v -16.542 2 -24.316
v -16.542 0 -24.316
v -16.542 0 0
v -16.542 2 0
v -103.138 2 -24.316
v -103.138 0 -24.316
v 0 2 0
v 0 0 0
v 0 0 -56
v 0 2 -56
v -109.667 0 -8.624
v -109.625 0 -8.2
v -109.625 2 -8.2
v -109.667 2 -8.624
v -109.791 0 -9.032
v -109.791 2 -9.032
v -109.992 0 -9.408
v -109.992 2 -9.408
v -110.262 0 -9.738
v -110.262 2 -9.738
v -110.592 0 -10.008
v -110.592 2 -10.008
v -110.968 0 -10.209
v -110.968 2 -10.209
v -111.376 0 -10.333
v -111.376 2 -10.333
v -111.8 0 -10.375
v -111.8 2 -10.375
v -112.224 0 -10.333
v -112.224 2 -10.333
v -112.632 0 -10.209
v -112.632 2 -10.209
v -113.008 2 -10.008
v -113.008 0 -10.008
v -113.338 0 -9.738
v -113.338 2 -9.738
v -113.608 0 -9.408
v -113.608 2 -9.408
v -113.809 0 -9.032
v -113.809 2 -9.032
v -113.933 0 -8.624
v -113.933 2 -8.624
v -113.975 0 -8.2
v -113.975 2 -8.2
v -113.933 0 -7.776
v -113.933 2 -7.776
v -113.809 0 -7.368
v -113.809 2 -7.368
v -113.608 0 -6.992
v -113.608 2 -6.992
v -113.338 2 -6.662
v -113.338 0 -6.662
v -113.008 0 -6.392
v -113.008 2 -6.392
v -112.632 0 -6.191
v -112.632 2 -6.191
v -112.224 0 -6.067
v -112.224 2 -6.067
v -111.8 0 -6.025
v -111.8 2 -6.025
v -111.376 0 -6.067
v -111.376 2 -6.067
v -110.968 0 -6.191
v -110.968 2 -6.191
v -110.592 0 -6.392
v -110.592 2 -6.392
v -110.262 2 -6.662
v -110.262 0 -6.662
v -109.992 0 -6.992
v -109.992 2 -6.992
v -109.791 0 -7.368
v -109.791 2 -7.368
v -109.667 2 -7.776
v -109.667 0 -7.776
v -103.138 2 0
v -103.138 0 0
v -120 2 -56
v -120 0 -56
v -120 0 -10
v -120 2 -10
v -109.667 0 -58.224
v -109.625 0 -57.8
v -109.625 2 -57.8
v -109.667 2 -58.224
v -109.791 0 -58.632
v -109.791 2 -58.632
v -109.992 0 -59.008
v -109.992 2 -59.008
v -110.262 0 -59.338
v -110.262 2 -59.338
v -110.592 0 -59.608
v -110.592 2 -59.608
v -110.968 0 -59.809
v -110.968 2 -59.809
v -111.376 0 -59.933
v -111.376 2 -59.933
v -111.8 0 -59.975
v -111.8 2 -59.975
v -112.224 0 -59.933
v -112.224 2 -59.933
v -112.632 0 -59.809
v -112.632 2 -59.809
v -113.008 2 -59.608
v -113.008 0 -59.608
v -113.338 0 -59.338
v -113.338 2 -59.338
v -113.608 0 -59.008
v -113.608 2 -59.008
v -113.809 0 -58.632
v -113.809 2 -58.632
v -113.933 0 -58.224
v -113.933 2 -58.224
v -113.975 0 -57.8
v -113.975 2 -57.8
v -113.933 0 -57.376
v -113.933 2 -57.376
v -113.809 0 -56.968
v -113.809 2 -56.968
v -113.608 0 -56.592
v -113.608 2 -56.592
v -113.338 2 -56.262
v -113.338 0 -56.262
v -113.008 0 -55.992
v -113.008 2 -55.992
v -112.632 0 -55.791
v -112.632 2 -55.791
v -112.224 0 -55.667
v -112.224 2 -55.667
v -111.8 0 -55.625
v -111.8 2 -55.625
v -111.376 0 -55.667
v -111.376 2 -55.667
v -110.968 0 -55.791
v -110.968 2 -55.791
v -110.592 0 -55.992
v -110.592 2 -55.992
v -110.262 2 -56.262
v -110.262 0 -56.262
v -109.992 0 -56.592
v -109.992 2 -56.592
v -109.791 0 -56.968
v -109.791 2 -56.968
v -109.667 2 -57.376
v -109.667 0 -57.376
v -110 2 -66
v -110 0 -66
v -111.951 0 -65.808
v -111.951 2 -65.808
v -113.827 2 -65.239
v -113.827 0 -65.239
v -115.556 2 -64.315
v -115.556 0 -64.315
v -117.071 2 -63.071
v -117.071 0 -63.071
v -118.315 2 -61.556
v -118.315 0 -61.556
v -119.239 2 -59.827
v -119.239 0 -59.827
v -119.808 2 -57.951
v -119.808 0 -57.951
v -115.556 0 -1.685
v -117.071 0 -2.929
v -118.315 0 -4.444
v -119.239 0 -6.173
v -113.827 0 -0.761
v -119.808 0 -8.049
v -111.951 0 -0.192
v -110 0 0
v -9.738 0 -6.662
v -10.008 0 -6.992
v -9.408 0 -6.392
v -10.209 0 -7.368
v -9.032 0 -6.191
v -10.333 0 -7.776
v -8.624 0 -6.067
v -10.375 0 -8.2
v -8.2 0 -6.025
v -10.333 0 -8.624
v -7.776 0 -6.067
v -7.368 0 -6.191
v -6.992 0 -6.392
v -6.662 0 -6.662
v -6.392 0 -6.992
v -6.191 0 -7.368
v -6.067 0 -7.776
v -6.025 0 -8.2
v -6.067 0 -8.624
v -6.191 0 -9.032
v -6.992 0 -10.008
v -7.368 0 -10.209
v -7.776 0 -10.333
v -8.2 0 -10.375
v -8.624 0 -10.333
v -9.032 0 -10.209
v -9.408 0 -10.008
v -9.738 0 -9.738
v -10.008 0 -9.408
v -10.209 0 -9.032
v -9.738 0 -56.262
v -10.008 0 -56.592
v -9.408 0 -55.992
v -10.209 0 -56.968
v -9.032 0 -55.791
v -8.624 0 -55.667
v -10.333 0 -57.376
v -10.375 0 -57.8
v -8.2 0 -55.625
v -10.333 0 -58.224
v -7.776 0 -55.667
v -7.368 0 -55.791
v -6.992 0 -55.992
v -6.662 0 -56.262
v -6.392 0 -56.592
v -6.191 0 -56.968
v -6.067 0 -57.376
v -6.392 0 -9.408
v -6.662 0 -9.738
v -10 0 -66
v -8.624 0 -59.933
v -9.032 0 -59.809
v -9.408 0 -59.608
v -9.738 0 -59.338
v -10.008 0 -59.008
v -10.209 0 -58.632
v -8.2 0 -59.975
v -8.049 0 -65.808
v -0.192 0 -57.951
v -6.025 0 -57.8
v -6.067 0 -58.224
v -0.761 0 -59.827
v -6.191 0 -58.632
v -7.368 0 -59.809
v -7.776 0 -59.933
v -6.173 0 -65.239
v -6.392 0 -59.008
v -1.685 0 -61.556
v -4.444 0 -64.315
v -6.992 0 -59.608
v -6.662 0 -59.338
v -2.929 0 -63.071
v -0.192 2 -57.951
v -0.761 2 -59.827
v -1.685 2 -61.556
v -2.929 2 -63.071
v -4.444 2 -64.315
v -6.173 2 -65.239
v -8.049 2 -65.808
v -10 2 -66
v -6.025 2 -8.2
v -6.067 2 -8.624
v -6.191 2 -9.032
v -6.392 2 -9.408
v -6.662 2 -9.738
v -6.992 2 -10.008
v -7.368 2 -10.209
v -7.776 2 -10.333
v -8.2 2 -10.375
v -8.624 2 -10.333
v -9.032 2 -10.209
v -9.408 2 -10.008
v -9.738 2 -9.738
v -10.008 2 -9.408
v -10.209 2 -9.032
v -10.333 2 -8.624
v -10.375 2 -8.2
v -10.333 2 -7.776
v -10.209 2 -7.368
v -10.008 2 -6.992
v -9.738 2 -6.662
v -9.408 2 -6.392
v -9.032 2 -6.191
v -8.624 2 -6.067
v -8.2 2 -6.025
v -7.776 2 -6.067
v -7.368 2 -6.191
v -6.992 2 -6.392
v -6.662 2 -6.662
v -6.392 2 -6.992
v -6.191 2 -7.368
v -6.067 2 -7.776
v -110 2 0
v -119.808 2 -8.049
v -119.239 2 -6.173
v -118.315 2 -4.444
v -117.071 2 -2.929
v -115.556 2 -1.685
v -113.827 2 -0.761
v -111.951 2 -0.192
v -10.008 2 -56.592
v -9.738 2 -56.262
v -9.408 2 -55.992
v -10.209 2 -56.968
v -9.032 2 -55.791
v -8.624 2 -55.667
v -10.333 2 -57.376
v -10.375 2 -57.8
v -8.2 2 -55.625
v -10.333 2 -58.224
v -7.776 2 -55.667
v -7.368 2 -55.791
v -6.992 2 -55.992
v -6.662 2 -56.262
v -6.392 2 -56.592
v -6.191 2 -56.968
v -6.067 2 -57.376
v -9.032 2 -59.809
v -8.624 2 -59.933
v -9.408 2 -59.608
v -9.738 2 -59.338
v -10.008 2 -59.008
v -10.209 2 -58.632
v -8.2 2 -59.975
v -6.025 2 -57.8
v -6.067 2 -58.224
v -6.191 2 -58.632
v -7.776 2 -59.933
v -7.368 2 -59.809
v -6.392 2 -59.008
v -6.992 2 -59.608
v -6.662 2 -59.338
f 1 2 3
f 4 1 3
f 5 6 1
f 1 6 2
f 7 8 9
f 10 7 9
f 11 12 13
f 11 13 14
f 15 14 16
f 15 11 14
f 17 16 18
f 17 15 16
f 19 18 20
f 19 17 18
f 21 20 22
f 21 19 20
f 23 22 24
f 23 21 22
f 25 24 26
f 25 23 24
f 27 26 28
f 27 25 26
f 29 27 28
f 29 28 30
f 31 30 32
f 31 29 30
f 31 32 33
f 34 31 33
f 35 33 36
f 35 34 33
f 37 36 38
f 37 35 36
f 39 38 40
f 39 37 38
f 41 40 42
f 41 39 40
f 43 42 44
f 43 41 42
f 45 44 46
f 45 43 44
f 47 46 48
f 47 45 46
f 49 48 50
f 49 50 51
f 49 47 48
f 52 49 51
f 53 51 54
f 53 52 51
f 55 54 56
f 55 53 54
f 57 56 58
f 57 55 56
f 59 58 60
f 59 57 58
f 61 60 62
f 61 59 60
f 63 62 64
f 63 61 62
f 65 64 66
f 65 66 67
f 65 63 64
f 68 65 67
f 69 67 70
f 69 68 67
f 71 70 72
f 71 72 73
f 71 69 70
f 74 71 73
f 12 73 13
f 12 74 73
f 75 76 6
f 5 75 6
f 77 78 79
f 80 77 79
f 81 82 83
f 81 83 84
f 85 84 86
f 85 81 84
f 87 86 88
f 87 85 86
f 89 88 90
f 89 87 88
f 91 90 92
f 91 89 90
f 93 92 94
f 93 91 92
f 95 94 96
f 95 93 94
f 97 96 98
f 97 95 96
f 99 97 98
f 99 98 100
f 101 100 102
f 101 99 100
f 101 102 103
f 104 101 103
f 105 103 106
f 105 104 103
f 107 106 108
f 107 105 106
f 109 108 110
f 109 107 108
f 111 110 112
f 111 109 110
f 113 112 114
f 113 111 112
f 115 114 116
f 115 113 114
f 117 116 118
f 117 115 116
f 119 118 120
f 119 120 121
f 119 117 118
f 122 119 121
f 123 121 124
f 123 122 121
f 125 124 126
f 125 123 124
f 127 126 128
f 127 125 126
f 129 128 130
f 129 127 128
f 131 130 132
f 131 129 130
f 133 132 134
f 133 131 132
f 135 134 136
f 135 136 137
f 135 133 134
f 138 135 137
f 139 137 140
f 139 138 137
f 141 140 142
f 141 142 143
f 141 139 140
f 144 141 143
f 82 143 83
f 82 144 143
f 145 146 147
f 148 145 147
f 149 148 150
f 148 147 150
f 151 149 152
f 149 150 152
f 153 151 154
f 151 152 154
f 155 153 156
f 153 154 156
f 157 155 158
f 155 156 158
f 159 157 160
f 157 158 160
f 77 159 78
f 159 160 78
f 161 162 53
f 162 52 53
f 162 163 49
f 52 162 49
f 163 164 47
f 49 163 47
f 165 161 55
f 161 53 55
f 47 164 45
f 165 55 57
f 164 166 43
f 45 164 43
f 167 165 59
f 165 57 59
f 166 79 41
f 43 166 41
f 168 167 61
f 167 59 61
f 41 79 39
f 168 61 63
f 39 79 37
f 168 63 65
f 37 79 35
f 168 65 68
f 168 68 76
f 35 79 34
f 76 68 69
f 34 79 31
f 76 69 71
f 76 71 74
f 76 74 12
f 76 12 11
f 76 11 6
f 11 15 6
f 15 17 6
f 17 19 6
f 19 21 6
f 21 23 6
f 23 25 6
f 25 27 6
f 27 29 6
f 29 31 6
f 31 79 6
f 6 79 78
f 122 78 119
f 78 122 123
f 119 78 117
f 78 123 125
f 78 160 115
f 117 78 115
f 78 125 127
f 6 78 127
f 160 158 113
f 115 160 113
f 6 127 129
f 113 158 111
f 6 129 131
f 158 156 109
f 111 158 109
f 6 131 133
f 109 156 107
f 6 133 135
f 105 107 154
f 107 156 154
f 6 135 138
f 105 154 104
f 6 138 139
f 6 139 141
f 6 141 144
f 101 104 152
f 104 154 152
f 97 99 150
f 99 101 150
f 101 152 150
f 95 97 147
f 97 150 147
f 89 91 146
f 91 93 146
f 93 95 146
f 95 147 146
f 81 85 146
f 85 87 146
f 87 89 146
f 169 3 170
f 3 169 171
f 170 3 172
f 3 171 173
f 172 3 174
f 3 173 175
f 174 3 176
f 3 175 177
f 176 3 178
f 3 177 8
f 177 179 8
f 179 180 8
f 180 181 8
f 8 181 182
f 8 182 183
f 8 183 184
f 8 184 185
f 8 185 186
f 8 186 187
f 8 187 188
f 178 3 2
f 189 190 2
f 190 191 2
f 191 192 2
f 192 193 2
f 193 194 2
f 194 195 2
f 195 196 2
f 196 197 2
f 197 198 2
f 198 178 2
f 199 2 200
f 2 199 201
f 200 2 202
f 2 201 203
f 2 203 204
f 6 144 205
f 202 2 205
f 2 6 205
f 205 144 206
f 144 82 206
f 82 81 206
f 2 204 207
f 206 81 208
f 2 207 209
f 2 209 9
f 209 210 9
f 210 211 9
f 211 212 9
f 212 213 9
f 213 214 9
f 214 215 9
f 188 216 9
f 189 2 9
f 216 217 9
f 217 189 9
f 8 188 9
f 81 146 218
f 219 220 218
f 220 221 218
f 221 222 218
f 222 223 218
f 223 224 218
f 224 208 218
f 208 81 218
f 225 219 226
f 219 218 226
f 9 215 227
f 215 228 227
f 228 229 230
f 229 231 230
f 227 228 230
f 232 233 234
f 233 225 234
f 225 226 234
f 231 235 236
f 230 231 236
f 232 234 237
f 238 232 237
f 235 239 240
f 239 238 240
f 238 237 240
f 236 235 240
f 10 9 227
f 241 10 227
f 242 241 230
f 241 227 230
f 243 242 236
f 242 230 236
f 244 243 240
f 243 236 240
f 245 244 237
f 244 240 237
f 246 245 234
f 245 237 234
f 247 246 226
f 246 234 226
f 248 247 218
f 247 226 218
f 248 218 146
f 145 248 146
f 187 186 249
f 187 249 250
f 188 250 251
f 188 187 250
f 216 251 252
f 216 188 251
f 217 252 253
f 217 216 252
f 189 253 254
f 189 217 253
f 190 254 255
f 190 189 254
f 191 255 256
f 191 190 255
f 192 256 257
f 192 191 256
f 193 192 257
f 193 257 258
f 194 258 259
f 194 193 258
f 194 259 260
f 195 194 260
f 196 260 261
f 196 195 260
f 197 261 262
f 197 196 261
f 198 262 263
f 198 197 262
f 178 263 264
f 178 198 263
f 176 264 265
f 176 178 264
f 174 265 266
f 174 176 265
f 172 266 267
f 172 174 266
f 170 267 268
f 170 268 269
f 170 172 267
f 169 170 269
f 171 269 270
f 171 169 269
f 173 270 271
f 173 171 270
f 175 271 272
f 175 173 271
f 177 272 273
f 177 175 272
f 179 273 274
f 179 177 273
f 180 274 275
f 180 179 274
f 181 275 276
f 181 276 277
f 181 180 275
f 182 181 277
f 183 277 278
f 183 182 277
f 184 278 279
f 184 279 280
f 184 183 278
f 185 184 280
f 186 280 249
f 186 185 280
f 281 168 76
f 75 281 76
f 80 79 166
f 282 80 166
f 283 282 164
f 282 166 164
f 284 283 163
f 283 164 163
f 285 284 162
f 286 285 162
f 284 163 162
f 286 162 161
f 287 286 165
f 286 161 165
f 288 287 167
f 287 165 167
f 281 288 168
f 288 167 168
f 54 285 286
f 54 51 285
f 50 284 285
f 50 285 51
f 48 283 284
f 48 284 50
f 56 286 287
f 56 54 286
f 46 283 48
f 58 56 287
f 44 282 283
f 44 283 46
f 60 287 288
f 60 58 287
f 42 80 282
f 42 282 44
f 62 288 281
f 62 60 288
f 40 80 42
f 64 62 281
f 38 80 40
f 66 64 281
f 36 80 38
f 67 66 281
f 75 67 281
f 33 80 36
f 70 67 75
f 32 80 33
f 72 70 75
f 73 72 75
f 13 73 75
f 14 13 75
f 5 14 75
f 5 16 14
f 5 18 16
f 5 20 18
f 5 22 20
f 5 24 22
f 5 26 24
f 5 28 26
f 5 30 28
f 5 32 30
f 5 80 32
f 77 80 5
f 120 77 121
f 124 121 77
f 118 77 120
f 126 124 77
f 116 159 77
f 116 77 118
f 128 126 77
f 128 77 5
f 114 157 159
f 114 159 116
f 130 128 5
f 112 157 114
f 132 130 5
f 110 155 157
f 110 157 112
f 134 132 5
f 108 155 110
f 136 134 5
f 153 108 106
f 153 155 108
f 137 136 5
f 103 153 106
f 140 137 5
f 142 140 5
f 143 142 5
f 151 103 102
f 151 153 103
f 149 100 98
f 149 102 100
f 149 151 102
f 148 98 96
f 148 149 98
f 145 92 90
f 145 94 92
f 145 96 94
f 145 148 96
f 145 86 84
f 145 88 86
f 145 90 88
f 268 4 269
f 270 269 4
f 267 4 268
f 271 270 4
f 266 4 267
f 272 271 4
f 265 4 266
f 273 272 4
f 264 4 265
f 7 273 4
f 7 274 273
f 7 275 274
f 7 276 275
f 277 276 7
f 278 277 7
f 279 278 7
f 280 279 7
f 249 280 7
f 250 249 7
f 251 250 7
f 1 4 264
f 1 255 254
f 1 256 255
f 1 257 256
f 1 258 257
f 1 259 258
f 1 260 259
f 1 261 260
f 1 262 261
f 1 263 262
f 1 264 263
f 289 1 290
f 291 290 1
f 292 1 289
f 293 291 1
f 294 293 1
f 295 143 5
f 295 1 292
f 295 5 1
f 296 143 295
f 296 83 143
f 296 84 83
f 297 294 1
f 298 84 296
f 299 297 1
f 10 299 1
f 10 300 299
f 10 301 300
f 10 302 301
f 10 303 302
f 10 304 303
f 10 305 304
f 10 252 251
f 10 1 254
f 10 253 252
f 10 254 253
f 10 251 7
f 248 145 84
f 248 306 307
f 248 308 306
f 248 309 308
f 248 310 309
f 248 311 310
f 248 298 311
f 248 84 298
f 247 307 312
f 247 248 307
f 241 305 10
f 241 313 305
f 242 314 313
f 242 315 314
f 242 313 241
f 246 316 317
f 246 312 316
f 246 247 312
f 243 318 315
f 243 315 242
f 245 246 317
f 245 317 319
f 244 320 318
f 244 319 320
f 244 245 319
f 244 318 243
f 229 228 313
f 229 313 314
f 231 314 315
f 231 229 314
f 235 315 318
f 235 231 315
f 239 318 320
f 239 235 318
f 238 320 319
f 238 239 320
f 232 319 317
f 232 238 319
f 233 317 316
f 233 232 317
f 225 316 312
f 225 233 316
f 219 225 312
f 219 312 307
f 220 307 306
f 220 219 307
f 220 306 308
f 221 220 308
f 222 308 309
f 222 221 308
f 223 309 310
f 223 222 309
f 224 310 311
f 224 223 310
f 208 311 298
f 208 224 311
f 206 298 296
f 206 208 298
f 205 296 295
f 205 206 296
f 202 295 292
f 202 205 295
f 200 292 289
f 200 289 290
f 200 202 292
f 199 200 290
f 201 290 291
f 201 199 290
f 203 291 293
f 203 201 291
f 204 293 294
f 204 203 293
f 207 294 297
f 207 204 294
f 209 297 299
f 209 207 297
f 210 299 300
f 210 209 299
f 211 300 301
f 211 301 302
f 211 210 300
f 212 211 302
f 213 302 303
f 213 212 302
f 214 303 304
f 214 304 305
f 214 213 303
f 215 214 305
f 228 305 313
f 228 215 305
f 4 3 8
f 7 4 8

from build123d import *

# Parameters (mm, degrees)
CROQUIS1_R              = 2.175
SALIENTE_EXTRUIR1_DEPTH = 2


with BuildPart() as part:
    # Croquis1 → Saliente-Extruir1 (new body)
    with BuildSketch(Plane(origin=(0, 0, 0), x_dir=(1, 0, 0), z_dir=(0, 1, 0))):
        with BuildLine():
            Line((0, 0), (0, 56))
            ThreePointArc((0, 56), (-2.928932188, 63.071067812), (-10, 66))
            Line((-10, 66), (-110, 66))
            ThreePointArc((-110, 66), (-117.071067812, 63.071067812), (-120, 56))
            Line((-120, 56), (-120, 10))
            ThreePointArc((-120, 10), (-117.071067812, 2.928932188), (-110, 0))
            Line((-110, 0), (-103.13836414, 0))
            Line((-103.13836414, 0), (-103.13836414, 24.315705481))
            Line((-103.13836414, 24.315705481), (-16.541911164, 24.315705481))
            Line((-16.541911164, 24.315705481), (-16.541911164, 0))
            Line((-16.541911164, 0), (0, 0))
        make_face()
        with Locations((-8.2, 8.2)):
            Circle(CROQUIS1_R, mode=Mode.SUBTRACT)
        with Locations((-8.2, 57.8)):
            Circle(CROQUIS1_R, mode=Mode.SUBTRACT)
        with Locations((-111.8, 57.8)):
            Circle(CROQUIS1_R, mode=Mode.SUBTRACT)
        with Locations((-111.8, 8.2)):
            Circle(CROQUIS1_R, mode=Mode.SUBTRACT)
    extrude(amount=SALIENTE_EXTRUIR1_DEPTH)


solid = part.part
